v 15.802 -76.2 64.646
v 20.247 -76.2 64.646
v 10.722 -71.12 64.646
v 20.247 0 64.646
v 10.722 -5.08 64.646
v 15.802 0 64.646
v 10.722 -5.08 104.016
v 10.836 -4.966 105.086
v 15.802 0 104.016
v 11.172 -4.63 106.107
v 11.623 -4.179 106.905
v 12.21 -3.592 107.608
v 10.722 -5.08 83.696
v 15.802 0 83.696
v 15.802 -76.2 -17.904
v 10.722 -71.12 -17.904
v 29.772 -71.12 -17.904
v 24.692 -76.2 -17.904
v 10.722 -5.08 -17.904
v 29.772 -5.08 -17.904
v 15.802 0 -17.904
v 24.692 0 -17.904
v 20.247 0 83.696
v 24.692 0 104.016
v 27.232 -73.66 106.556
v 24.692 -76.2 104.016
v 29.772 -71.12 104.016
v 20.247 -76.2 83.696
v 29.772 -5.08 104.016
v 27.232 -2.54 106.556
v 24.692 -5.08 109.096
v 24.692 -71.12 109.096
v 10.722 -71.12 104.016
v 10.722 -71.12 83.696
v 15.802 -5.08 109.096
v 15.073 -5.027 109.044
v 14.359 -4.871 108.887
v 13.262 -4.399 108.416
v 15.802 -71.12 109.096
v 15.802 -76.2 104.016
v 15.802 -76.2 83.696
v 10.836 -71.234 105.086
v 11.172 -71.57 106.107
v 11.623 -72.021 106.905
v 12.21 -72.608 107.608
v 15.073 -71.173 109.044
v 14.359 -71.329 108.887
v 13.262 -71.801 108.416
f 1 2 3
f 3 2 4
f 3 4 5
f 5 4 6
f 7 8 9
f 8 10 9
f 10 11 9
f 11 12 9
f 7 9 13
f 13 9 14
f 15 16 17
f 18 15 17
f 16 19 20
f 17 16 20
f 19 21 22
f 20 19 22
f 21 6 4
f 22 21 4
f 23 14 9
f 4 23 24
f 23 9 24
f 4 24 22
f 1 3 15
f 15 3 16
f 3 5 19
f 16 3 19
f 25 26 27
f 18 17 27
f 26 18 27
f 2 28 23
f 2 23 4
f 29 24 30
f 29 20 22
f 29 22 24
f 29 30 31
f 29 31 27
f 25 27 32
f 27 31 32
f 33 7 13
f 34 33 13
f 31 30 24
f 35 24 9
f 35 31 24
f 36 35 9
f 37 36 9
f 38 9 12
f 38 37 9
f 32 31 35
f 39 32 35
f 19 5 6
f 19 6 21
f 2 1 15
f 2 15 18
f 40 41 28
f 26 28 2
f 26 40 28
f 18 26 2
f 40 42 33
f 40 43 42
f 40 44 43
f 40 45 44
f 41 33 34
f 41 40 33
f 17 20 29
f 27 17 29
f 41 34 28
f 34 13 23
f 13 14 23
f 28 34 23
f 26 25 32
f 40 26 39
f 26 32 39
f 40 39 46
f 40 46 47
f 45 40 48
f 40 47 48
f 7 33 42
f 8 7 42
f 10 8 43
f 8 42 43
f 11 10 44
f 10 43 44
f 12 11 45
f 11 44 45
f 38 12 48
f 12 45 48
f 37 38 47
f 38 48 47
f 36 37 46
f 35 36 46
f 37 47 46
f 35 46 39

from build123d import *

# Parameters (mm, degrees)
F1_DEPTH = 76.2
F2_SIZE  = 5.08
F3_SIZE  = 5.08
F4_R     = 5.08
F5_SIZE  = 5.08


with BuildPart() as f1:
    # F0 (on Front) → F1 (new body)
    with BuildSketch(Plane.XZ):
        Polygon((29.771948, -17.903628), (29.771948, 109.096372), (10.721948, 109.096372), (10.721948, 83.696372), (20.246948, 83.696372), (20.246948, 64.646372), (10.721948, 64.646372), (10.721948, -17.903628), align=None)
    extrude(amount=F1_DEPTH)

    # F2
    f2_edges = [f1.edges().sort_by_distance(p)[0] for p in [
        (29.771948, -38.1, 109.096372),
    ]]
    chamfer(f2_edges, length=F2_SIZE)

    # F3
    f3_edges = [f1.edges().sort_by_distance(p)[0] for p in [
        (17.706948, -76.2, 109.096372),
        (17.706948, 0, 109.096372),
    ]]
    chamfer(f3_edges, length=F3_SIZE)

    # F4
    f4_edges = [f1.edges().sort_by_distance(p)[0] for p in [
        (10.721948, -38.1, 109.096372),
    ]]
    fillet(f4_edges, radius=F4_R)

    # F5
    f5_edges = [f1.edges().sort_by_distance(p)[0] for p in [
        (10.721948, -76.2, 93.856372),
        (29.771948, -76.2, 43.056372),
        (10.721948, -76.2, 23.371372),
        (29.771948, 0, 43.056372),
        (10.721948, 0, 93.856372),
        (10.721948, 0, 23.371372),
    ]]
    chamfer(f5_edges, length=F5_SIZE)


solid = f1.part
